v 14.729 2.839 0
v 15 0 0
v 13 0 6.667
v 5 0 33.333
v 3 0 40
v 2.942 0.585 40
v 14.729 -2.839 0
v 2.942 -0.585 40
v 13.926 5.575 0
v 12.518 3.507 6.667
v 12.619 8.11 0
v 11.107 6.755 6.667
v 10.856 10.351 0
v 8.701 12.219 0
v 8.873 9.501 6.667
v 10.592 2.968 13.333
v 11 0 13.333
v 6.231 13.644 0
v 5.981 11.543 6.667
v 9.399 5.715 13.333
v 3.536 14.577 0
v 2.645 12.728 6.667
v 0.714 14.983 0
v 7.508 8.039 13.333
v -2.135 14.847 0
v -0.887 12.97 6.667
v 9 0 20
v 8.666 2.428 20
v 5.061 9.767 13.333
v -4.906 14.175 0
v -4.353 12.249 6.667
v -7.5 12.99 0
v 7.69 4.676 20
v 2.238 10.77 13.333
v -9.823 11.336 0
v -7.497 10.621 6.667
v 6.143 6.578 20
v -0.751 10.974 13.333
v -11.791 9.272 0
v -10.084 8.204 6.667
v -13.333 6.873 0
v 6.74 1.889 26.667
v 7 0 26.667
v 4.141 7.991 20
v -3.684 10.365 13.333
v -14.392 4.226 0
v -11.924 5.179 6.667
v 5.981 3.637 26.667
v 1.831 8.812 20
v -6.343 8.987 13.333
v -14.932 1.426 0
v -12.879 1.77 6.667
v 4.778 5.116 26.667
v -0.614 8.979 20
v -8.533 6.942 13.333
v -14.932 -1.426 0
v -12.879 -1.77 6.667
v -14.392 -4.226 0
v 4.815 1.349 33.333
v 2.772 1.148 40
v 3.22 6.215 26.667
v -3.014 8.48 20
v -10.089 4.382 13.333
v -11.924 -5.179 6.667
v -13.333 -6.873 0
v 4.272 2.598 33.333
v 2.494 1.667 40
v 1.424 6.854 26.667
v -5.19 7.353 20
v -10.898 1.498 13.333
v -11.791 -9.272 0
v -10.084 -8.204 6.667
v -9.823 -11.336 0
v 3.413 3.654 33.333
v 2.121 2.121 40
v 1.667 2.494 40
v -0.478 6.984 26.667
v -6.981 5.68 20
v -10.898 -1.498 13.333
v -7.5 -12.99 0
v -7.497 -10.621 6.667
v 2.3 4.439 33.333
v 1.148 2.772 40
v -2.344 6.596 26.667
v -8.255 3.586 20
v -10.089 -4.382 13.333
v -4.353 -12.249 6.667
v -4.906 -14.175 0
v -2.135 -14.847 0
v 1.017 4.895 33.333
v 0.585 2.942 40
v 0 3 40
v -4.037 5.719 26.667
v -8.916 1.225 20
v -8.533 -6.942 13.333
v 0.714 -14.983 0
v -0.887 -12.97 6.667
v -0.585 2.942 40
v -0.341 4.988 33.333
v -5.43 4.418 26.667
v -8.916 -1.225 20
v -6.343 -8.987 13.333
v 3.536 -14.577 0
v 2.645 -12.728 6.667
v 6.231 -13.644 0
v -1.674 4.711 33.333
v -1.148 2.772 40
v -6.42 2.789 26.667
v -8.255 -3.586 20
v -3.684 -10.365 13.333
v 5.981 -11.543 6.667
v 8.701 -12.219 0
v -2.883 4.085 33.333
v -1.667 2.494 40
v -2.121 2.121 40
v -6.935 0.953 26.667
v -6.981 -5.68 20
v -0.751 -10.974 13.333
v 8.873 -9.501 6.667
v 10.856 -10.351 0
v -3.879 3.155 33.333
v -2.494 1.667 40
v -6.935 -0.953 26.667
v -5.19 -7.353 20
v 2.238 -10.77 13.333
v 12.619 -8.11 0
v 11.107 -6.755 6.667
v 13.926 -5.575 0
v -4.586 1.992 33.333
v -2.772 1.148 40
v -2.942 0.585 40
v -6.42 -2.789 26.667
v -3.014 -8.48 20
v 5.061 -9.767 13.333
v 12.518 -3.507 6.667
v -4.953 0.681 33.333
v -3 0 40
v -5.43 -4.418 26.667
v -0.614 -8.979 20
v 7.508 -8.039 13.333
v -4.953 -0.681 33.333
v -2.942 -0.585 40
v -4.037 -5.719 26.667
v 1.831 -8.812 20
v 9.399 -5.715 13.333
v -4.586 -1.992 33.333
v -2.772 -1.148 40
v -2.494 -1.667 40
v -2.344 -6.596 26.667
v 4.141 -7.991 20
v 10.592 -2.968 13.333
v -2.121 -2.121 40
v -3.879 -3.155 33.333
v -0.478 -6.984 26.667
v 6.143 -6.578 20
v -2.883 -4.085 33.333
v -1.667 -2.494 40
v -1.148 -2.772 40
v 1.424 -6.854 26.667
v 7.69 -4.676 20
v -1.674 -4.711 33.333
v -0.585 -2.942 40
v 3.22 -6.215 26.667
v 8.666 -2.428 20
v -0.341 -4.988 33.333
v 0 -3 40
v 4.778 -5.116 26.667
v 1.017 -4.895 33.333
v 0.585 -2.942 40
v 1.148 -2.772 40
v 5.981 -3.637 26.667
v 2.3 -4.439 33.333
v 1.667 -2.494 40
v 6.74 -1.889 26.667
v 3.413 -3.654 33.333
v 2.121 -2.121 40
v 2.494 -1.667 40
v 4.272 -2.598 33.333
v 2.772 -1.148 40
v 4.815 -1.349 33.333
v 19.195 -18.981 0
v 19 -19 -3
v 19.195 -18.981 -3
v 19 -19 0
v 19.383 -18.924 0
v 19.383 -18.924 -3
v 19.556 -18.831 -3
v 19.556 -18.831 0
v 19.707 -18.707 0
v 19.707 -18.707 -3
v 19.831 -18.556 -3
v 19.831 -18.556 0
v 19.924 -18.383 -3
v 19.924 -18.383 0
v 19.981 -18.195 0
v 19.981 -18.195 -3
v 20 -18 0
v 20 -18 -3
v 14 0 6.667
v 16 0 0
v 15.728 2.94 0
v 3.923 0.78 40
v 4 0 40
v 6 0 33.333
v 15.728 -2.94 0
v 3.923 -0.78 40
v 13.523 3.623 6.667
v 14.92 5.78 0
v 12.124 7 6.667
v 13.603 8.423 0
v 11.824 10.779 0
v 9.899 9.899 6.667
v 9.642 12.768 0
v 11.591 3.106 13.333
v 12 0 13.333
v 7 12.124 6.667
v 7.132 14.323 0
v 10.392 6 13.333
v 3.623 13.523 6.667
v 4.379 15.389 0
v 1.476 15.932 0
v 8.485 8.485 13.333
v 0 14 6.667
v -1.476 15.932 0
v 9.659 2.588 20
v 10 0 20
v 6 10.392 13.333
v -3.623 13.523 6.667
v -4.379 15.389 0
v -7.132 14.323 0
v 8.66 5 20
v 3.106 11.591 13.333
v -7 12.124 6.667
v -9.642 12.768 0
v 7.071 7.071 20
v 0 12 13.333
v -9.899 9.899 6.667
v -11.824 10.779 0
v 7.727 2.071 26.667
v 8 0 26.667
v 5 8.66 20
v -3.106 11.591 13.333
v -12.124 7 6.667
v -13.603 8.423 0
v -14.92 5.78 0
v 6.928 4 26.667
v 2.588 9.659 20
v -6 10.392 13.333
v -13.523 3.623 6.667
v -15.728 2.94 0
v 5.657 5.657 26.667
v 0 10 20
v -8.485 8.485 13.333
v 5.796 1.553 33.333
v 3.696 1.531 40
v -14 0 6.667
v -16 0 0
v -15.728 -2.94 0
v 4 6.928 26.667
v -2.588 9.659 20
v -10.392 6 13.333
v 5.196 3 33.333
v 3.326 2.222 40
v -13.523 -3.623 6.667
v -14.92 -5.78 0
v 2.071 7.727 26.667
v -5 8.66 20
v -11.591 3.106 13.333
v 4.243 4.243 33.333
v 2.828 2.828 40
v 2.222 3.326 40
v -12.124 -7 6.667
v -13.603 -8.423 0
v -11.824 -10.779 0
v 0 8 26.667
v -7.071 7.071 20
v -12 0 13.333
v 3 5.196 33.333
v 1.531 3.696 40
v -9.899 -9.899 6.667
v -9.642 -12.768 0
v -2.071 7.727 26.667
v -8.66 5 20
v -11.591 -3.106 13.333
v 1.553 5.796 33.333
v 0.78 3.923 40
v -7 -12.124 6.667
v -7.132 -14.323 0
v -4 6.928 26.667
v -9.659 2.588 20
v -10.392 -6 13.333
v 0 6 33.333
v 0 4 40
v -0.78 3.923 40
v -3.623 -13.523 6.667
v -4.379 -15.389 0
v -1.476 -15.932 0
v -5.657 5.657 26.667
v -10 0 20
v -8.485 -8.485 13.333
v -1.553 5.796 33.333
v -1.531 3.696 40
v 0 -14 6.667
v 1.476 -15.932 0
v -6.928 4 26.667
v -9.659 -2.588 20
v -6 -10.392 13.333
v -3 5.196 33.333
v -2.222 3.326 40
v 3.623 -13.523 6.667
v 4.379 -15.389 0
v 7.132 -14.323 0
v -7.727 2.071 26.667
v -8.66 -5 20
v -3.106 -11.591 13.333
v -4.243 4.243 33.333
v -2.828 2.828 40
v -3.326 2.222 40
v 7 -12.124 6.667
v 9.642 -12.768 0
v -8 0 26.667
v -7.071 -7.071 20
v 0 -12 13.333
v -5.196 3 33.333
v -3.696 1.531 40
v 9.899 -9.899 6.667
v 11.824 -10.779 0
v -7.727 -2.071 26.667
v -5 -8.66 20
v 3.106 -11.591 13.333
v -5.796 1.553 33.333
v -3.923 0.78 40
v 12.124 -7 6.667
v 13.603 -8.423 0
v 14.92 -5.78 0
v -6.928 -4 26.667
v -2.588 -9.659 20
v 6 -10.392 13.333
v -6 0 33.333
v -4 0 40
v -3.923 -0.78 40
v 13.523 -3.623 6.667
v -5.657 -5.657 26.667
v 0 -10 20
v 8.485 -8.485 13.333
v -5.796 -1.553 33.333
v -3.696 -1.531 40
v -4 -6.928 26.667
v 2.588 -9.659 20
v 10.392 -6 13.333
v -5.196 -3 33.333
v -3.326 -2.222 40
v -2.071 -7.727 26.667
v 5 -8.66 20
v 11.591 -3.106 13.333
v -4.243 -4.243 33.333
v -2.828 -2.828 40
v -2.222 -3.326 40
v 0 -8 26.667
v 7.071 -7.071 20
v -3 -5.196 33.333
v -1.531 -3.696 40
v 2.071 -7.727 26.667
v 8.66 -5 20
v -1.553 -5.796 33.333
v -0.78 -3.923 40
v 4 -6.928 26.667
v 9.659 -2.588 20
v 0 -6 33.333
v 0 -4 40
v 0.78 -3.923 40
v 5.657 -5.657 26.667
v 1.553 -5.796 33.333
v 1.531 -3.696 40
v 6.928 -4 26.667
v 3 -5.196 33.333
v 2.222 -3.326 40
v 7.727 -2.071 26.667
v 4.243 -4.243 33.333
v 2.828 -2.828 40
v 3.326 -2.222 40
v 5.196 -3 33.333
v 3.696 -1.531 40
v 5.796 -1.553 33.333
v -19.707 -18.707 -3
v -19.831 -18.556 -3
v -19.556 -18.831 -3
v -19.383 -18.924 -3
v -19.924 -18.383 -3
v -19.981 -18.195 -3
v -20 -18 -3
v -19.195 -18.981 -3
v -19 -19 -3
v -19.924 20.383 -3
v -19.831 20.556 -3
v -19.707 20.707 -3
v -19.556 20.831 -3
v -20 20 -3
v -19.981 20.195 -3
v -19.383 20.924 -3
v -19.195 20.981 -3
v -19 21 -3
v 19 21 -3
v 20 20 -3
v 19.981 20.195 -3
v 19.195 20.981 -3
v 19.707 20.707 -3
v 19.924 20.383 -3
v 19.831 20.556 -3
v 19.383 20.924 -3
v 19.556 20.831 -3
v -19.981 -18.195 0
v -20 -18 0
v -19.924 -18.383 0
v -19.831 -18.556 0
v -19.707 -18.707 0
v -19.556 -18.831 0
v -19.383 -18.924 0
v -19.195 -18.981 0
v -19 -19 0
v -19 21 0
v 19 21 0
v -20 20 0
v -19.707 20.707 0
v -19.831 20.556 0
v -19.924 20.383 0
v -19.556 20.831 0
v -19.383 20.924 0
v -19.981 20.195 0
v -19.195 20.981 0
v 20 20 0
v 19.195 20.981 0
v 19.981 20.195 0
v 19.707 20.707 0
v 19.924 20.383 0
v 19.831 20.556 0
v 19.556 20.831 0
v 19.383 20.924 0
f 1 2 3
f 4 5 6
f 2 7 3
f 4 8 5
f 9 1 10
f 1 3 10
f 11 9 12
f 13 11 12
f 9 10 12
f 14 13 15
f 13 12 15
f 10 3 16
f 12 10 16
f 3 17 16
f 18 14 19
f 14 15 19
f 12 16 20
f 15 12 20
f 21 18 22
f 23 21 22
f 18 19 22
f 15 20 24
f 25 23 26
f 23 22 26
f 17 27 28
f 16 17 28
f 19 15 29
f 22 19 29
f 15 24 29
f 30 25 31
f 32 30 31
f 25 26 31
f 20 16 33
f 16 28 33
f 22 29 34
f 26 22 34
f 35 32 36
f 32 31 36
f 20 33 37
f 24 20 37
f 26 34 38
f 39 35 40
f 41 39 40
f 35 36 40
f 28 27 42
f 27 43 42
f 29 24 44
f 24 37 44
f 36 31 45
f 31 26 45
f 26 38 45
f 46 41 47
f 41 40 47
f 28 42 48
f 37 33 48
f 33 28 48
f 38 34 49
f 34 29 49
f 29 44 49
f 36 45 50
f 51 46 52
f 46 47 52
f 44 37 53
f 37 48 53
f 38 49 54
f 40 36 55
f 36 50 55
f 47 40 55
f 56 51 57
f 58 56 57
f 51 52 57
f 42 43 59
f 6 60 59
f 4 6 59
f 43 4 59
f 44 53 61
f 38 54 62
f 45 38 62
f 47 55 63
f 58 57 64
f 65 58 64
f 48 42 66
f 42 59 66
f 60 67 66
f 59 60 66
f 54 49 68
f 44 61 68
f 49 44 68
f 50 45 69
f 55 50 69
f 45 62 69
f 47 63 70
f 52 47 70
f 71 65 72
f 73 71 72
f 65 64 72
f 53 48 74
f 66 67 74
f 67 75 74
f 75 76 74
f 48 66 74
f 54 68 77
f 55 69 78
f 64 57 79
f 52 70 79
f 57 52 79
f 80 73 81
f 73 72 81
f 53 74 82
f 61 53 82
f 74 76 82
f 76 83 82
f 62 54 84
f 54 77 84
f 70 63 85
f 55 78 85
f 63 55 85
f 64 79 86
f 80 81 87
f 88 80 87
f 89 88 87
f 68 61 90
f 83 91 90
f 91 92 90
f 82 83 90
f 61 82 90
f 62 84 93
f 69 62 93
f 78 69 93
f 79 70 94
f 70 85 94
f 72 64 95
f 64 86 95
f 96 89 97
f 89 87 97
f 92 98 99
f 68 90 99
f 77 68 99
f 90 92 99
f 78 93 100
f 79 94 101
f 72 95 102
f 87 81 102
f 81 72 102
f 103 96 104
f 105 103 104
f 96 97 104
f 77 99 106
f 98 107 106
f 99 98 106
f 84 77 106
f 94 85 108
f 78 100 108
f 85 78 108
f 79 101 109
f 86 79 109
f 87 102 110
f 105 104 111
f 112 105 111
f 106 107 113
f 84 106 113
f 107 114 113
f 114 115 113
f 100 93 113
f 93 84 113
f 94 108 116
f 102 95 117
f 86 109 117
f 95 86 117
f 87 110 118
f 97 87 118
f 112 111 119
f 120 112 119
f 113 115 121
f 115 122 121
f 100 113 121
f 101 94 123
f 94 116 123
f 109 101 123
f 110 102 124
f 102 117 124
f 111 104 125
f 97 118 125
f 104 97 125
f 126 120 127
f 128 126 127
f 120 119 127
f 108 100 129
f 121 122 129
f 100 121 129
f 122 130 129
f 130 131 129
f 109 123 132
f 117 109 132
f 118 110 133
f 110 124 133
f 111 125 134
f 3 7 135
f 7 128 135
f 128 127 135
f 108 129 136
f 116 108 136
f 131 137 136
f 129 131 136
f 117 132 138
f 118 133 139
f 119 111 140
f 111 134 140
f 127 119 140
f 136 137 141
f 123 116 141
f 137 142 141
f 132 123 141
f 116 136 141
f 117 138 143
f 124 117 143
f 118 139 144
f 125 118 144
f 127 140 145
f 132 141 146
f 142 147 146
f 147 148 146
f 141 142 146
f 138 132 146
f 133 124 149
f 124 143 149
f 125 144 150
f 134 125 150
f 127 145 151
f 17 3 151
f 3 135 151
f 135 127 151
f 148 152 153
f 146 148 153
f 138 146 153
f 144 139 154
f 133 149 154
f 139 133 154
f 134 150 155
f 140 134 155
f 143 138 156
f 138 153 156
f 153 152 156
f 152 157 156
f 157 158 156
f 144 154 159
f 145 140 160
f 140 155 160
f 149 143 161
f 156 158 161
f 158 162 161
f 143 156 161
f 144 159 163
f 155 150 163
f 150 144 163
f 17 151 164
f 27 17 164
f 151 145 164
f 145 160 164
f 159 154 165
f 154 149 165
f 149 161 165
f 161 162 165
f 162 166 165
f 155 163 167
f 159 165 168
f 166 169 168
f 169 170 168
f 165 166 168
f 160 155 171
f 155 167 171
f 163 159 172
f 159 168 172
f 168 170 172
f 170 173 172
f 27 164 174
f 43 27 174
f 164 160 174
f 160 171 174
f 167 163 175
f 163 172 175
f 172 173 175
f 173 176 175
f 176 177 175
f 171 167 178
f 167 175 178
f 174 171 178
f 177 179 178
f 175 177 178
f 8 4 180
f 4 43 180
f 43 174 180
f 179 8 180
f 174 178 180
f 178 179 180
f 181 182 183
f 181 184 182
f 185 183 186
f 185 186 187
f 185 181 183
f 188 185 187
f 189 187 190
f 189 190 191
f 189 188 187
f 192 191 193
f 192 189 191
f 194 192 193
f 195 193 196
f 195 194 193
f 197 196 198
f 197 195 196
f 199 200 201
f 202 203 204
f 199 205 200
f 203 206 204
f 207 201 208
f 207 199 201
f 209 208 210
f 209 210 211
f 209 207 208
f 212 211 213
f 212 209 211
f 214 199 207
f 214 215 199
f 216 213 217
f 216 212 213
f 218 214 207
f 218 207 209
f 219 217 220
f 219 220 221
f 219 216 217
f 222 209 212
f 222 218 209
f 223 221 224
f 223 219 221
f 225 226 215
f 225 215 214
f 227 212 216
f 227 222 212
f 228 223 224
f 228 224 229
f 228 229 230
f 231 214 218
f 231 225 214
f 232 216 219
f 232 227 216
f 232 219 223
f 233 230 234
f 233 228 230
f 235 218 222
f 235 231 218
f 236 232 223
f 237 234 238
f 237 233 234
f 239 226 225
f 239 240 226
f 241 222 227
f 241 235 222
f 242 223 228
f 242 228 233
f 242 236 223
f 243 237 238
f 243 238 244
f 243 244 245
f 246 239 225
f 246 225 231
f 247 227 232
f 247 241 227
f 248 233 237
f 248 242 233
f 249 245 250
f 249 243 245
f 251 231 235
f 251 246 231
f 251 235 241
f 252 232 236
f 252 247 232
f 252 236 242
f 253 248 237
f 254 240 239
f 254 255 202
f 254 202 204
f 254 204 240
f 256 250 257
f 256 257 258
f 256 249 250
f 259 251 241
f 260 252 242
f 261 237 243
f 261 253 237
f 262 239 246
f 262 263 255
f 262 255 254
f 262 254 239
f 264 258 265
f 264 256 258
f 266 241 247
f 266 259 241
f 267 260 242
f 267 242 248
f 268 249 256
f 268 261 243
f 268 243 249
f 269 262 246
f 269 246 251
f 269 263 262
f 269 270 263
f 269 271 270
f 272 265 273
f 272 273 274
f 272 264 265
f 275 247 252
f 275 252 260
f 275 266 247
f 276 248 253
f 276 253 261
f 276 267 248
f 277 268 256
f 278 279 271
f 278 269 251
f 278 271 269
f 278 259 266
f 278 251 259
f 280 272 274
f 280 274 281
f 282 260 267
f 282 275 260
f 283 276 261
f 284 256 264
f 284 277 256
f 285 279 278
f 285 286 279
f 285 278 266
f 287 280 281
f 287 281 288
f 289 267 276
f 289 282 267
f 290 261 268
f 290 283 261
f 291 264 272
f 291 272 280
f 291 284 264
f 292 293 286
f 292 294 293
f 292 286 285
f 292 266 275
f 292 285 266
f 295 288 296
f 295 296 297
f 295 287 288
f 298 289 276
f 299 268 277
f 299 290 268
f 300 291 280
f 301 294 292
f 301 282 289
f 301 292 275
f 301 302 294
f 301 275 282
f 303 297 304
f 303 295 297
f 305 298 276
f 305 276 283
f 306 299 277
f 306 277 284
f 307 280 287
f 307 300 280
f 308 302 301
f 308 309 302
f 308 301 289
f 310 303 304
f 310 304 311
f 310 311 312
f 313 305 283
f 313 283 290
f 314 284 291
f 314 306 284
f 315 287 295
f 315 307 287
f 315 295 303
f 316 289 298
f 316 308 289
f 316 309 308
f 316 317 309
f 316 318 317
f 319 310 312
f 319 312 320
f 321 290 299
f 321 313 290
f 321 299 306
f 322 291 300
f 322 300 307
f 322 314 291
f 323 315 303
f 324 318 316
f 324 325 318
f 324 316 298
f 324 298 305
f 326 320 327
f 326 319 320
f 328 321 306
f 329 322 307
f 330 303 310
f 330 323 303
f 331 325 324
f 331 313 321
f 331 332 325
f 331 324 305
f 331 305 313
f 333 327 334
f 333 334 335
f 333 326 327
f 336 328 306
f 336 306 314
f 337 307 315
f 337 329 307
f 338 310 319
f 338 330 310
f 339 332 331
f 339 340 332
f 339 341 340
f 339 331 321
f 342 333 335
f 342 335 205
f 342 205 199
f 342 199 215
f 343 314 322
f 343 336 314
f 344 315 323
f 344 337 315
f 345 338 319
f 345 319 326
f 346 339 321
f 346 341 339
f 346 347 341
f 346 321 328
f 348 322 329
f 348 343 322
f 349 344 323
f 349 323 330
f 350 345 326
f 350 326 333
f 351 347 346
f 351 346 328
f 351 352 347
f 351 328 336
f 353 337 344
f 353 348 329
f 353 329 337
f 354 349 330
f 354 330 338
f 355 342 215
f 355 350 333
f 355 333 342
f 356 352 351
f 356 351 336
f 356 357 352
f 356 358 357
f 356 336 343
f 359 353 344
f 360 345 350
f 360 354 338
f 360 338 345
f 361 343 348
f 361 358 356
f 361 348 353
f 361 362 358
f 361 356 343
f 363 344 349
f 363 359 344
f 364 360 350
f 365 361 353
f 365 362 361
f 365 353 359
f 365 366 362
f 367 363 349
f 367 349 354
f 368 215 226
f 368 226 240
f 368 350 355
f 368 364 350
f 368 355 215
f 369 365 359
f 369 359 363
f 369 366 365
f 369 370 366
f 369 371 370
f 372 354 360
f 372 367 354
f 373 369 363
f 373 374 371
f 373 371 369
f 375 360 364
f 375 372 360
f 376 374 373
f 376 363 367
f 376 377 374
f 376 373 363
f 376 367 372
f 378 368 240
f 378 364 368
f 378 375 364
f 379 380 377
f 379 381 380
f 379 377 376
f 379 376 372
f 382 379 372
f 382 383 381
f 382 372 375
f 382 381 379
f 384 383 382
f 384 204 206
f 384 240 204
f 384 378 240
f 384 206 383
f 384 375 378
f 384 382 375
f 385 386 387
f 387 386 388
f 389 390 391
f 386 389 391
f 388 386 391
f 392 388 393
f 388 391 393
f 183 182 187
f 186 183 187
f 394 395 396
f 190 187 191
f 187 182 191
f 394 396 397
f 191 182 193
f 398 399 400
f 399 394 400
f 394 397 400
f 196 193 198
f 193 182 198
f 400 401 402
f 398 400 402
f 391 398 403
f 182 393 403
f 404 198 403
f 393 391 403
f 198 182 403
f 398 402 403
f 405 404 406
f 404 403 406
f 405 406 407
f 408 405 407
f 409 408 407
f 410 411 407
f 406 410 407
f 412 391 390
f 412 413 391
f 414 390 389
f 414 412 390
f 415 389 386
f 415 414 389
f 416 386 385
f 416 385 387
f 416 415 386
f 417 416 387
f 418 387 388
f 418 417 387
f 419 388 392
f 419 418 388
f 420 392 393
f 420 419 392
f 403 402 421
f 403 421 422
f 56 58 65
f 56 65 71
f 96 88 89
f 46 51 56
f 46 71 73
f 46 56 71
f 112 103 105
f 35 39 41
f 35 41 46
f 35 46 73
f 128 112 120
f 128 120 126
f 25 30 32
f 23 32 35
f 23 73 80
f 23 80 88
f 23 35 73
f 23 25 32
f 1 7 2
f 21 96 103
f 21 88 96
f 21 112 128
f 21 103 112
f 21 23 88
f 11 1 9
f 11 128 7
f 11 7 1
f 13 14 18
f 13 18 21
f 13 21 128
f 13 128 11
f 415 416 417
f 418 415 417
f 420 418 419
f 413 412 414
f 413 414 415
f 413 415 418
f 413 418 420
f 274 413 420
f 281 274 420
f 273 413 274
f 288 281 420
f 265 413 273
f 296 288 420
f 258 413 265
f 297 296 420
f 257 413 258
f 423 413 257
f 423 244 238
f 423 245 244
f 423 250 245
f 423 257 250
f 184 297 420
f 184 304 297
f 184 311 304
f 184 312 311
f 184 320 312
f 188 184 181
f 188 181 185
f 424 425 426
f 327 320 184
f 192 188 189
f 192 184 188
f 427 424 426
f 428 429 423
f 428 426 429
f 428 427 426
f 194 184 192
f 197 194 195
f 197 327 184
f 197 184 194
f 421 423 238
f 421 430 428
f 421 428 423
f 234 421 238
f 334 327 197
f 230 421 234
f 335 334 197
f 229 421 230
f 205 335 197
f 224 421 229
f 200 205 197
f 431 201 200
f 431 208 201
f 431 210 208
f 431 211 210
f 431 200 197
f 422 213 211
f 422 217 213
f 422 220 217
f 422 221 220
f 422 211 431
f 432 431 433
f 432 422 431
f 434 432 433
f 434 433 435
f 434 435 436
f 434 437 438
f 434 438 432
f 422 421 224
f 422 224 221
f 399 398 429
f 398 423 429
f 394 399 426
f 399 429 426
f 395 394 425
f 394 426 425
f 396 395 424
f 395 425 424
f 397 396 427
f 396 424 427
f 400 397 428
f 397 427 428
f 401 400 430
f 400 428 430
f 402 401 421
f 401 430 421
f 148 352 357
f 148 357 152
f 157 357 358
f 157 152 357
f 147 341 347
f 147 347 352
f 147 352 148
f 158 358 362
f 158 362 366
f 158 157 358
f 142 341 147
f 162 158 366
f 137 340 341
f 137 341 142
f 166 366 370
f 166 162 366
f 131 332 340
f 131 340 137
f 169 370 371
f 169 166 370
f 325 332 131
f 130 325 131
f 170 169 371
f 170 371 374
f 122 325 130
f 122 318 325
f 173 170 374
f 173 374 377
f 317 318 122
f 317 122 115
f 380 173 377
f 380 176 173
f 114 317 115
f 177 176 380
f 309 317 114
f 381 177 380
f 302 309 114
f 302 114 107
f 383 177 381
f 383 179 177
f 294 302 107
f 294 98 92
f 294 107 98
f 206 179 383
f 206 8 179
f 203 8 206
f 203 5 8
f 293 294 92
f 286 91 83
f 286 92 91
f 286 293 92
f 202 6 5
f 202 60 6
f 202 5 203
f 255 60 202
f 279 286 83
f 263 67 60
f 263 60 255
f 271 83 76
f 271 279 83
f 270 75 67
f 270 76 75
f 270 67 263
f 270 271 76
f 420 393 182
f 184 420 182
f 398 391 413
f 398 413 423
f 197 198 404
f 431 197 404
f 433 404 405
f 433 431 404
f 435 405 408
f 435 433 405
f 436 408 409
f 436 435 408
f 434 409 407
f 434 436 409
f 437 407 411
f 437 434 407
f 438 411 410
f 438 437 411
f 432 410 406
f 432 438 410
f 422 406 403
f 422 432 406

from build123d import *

# Parameters (mm, degrees)
BOX_W     = 40
BOX_H     = 40
BOX_DEPTH = 3
FILLET_R  = 1


with BuildPart() as fillet_body:
    # Box → Box (new body)
    with BuildSketch(Plane.XY.offset(-3)):
        with Locations((20, 20)):
            Rectangle(BOX_W, BOX_H)
    extrude(amount=BOX_DEPTH)

    # Fillet
    fillet_edges = [fillet_body.edges().sort_by_distance(p)[0] for p in [
        (0, 0, -1.5),
        (0, 40, -1.5),
        (40, 0, -1.5),
        (40, 40, -1.5),
    ]]
    fillet(fillet_edges, radius=FILLET_R)


with BuildPart() as fillet_body_1:
    # Fillet placement: moved
    add(fillet_body.part.moved(Location((-20, -19, 0))))


with BuildPart() as cone001:
    # Cone001 → Cone001 (revolve)
    with BuildSketch(Plane.XZ):
        Polygon((0, 0), (15, 0), (3, 40), (0, 40), align=None)
    revolve(axis=Axis((0, 0, 0), (0, 0, 1)))


with BuildPart() as fusion:
    # Cone → Cone (revolve)
    with BuildSketch(Plane.XZ):
        Polygon((0, 0), (16, 0), (4, 40), (0, 40), align=None)
    revolve(axis=Axis((0, 0, 0), (0, 0, 1)))

    # Cut: cut Cone001
    add(cone001.part, mode=Mode.SUBTRACT)

    # Fusion: union Fillet body
    add(fillet_body_1.part)


solid = fusion.part
